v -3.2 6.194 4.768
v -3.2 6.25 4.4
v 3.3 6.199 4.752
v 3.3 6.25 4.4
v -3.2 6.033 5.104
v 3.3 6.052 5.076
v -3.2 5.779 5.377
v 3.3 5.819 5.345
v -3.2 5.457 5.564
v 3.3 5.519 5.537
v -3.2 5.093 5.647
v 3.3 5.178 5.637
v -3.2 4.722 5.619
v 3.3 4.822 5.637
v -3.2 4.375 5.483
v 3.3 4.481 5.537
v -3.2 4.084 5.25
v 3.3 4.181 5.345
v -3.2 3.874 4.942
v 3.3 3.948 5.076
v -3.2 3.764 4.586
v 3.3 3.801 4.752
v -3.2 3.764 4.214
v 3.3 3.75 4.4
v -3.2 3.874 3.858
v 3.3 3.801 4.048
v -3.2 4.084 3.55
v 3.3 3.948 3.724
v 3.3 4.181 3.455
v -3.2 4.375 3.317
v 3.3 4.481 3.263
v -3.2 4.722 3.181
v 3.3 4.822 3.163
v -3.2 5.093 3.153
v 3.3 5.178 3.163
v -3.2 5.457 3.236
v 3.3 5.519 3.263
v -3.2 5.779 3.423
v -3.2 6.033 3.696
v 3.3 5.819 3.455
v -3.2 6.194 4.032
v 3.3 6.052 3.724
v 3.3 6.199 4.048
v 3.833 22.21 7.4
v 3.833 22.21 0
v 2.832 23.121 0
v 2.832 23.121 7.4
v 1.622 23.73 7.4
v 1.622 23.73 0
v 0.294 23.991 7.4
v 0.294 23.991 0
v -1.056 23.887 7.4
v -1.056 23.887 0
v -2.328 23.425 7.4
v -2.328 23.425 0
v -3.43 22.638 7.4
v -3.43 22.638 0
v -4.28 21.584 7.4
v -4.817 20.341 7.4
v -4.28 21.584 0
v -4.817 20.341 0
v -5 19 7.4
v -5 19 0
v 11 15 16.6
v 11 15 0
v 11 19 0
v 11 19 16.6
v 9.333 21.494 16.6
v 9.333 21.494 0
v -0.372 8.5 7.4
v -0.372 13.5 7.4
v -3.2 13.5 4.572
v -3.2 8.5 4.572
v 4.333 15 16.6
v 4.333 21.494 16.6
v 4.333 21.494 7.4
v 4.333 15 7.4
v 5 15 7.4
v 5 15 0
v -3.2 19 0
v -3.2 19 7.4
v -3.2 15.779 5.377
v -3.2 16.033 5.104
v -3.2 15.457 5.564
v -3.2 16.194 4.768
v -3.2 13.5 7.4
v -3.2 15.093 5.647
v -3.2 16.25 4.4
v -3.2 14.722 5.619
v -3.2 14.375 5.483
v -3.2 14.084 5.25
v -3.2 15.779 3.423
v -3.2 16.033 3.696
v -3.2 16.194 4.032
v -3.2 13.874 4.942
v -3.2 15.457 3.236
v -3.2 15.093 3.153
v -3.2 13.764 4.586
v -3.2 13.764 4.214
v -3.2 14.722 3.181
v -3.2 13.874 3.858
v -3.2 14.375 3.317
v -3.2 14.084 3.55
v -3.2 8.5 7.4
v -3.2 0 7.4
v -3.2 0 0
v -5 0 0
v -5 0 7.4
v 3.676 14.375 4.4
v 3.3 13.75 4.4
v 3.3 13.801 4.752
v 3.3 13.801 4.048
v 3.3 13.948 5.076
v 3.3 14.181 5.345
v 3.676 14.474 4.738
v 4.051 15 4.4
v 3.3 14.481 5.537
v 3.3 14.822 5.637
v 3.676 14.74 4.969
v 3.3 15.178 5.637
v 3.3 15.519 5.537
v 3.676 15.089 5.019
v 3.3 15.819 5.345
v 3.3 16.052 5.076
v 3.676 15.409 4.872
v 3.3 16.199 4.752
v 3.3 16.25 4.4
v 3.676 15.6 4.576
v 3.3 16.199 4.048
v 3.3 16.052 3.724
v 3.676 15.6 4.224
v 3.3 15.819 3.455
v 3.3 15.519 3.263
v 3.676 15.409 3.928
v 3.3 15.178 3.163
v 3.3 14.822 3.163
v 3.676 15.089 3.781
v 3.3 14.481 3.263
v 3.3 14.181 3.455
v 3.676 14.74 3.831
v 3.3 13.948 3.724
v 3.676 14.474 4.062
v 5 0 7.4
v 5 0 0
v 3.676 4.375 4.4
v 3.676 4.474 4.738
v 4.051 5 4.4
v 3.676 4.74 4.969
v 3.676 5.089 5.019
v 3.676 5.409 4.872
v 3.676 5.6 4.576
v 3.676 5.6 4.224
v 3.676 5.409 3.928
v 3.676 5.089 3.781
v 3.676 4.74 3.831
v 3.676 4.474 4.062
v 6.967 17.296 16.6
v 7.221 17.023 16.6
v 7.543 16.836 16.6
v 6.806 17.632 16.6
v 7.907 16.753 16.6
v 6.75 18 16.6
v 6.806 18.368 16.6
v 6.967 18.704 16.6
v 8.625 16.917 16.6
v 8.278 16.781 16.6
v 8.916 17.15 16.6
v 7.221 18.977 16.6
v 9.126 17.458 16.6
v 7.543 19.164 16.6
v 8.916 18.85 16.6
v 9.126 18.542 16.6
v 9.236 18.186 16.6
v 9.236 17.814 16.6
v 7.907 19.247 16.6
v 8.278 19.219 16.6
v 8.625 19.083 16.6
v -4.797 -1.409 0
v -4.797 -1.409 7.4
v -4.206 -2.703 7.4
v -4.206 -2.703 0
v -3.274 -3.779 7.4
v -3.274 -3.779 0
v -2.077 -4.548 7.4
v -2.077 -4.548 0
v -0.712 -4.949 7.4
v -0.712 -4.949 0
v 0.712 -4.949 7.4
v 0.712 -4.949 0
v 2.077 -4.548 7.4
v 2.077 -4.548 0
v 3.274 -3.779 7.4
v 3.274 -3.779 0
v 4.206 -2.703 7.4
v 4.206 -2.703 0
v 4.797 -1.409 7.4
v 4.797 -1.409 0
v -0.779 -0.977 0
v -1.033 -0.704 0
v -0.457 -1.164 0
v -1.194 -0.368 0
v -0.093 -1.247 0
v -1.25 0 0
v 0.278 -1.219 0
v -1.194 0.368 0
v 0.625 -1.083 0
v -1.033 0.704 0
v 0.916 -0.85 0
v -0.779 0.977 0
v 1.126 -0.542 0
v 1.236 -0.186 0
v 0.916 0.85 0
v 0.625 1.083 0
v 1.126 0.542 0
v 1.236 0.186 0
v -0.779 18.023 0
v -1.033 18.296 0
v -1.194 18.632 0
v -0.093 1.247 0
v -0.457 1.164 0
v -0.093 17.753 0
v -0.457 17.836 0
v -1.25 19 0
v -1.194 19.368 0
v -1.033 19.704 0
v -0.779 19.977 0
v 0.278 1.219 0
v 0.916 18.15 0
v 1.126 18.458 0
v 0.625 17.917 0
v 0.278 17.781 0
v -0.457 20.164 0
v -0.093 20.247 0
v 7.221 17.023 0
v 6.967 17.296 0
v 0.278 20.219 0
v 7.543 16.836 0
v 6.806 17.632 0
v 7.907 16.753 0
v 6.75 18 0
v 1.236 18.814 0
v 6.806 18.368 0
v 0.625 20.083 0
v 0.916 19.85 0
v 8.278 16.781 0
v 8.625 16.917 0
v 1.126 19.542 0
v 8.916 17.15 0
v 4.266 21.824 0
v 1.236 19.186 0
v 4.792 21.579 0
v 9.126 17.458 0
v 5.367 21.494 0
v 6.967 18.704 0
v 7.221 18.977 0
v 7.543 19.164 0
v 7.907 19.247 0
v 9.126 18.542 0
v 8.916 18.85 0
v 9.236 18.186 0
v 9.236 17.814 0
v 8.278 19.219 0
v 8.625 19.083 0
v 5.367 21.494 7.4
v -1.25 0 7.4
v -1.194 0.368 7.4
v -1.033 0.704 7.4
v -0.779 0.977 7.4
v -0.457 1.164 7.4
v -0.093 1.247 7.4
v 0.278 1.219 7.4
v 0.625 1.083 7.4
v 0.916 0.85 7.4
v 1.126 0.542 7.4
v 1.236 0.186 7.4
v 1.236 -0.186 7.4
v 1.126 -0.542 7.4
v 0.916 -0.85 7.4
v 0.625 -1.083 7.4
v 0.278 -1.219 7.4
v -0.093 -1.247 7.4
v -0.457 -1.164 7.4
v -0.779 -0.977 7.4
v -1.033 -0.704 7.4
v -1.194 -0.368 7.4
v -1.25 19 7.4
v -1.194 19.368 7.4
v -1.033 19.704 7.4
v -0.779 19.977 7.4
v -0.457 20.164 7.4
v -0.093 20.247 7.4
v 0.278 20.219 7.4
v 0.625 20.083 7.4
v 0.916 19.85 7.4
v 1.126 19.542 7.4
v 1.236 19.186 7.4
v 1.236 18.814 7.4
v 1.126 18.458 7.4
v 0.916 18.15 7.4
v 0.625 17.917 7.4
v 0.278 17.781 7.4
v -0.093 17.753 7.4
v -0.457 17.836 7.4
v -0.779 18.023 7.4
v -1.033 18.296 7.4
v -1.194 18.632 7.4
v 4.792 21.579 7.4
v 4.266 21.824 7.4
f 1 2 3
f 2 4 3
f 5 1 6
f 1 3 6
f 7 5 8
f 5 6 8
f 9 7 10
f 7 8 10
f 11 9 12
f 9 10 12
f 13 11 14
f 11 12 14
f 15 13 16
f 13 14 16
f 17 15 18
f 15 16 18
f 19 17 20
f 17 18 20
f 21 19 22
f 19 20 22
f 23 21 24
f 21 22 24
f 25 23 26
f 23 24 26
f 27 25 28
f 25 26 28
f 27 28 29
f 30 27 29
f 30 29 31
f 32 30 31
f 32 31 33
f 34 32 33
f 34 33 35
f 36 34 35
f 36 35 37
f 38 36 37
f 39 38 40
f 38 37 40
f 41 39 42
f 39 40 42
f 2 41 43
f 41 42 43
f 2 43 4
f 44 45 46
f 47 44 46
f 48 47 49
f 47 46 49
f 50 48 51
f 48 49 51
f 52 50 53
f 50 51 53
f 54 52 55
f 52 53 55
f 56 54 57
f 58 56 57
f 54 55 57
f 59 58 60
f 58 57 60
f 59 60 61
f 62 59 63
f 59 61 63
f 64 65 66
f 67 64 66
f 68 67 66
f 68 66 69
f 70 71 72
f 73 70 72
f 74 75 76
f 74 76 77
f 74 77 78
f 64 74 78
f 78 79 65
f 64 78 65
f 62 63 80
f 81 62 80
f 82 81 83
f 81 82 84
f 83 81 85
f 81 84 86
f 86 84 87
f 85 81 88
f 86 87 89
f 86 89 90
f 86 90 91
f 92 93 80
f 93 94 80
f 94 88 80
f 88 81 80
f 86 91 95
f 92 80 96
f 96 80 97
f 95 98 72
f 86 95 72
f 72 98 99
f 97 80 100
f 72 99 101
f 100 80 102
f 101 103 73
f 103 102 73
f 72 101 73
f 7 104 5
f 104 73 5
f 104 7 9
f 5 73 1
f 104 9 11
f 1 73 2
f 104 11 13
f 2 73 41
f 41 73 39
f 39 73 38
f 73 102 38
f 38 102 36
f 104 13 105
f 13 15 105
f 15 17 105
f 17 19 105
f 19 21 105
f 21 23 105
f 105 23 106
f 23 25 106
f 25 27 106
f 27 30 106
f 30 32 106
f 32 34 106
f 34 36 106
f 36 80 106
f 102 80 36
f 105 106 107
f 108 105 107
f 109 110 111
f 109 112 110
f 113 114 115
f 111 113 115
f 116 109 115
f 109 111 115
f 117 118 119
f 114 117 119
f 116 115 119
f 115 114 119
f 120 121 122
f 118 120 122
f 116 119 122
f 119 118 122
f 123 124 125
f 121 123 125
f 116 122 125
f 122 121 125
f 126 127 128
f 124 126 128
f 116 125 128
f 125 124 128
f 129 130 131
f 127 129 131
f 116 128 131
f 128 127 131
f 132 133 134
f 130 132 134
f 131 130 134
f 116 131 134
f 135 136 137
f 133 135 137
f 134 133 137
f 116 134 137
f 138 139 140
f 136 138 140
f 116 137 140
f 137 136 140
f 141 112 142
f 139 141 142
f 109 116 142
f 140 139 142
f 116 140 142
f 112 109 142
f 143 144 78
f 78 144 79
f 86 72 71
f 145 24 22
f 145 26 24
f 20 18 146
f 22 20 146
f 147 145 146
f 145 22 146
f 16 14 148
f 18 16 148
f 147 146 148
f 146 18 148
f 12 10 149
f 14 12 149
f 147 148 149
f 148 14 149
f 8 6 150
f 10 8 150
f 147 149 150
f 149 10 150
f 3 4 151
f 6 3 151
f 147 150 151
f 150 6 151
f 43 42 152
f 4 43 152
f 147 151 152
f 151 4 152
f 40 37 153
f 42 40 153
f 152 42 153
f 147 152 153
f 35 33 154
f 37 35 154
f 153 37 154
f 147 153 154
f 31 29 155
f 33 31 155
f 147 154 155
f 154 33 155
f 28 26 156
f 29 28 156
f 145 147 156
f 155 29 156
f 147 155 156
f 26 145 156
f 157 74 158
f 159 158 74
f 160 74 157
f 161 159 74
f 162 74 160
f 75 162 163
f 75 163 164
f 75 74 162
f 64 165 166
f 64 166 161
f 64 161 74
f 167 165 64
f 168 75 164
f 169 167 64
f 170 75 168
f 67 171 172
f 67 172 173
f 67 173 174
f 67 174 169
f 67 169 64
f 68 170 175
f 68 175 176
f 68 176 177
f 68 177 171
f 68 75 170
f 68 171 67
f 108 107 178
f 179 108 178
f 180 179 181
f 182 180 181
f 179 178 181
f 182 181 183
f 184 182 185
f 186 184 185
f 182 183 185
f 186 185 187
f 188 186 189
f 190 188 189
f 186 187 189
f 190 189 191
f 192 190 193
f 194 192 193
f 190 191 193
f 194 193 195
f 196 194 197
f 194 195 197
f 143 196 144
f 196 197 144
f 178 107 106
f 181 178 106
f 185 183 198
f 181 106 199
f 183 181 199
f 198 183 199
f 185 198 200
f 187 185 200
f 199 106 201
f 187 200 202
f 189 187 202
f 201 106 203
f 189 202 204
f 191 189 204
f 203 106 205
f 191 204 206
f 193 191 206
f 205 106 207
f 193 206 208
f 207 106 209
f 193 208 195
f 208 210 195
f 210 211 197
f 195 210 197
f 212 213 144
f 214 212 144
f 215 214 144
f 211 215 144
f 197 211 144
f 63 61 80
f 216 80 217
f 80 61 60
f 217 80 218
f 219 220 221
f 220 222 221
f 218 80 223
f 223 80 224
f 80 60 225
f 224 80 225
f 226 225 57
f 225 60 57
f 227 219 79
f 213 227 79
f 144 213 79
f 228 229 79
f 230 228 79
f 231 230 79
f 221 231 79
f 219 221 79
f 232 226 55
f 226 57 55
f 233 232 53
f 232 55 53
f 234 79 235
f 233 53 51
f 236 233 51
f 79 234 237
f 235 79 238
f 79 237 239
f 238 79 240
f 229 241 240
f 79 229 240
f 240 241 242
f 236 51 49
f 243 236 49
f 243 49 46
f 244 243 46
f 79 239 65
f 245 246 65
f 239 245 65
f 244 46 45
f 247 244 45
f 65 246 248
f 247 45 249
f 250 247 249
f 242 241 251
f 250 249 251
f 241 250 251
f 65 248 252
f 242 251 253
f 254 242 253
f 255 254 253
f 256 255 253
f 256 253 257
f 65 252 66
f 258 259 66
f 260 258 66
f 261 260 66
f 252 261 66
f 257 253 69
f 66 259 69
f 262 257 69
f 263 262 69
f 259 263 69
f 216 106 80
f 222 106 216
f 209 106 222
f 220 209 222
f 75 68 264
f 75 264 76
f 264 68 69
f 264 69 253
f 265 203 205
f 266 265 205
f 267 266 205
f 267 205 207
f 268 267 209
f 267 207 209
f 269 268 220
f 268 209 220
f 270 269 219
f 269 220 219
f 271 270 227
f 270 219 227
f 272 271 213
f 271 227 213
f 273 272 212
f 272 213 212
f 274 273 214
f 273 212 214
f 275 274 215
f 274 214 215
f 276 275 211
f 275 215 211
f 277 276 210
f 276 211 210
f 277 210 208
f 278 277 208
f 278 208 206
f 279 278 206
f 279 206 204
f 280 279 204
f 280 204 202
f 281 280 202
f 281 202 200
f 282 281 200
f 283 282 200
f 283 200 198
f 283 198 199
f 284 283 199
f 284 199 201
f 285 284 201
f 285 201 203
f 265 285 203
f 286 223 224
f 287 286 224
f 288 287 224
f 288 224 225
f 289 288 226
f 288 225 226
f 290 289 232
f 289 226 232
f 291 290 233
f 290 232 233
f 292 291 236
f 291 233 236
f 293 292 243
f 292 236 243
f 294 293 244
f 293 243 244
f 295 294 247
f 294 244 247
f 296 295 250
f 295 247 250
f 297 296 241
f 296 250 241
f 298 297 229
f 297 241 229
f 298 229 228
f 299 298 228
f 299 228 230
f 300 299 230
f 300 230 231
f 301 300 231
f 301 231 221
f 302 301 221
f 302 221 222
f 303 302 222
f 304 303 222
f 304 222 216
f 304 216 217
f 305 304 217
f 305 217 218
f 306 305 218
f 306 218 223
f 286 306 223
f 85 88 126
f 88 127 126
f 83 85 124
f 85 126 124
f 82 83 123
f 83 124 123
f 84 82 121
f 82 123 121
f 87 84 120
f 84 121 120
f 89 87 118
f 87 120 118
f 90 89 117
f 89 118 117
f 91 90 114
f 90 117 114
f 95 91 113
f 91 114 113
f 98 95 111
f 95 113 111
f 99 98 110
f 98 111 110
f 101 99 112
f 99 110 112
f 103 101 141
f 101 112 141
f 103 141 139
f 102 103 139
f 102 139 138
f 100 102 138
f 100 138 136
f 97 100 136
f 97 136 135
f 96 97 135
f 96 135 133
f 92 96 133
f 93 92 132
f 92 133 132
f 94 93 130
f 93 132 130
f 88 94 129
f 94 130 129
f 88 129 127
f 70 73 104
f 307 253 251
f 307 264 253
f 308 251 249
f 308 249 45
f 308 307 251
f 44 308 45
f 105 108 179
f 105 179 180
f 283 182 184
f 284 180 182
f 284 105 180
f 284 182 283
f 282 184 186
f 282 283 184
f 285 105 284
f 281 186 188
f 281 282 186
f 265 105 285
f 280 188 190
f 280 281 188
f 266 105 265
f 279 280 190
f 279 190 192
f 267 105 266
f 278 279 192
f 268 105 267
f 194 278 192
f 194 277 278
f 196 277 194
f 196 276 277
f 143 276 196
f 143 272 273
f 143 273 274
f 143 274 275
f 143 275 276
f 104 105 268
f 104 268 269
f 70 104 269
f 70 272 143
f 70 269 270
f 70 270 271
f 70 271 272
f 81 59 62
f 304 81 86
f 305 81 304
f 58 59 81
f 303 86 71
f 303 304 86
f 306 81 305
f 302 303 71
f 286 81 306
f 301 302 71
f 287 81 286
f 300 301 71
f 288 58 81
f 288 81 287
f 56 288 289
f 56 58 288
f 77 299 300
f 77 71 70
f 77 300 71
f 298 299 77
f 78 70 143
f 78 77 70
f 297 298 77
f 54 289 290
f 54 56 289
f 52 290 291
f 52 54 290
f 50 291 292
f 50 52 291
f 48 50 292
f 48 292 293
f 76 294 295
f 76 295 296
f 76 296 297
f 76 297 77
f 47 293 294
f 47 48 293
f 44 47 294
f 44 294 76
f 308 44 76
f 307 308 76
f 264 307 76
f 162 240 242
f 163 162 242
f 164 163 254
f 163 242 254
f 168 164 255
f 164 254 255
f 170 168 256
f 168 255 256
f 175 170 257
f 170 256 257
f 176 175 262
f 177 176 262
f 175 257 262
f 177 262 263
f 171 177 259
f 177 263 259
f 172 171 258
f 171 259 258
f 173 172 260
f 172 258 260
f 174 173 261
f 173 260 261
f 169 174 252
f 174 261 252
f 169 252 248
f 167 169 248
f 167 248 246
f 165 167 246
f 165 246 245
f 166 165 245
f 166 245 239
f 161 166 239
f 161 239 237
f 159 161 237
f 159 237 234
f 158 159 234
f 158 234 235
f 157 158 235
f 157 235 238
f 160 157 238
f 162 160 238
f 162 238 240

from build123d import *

# Parameters (mm, degrees)
EXTRUDE_1_DEPTH        = 7.4
EXTRUDE_2_DEPTH        = 9.2
HOLE_WIZARD_M3_1_D     = 2.5
HOLE_WIZARD_M3_1_DEPTH = 6.5
HOLE_WIZARD_M3_1_TIP   = 0.751075774
HOLE_WIZARD_M3_3_D     = 2.5
FILLET_1_R             = 2
CUT_EXTRUDE_1_DEPTH    = 5
HOLE_WIZARD_M3_5_D     = 2.5


with BuildPart() as part:
    # 草图1 → 凸台-拉伸1 (new body)
    with BuildSketch(Plane.XY):
        with BuildLine():
            Line((-3.2, 19), (-3.2, 0))
            Line((-3.2, 0), (-5, 0))
            ThreePointArc((-5, 0), (0, -5), (5, 0))
            Line((5, 0), (5, 4))
            Line((5, 4), (5, 15))
            Line((5, 15), (11, 15))
            Line((11, 15), (11, 19))
            Line((11, 19), (9.333333333, 21.494438258))
            Line((9.333333333, 21.494438258), (4.333333333, 21.494438258))
            ThreePointArc((4.333333333, 21.494438258), (-1.290994449, 23.830458915), (-5, 19))
            Line((-5, 19), (-3.2, 19))
        make_face()
    extrude(amount=EXTRUDE_1_DEPTH)

    # 草图2 → 凸台-拉伸2 (add)
    with BuildSketch(Plane.XY.offset(7.4)):
        Polygon((11, 19), (9.333333333, 21.494438258), (4.333333333, 21.494438258), (4.333333333, 15), (5, 15), (11, 15), align=None)
    extrude(amount=EXTRUDE_2_DEPTH)

    # M3 螺纹孔1
    with Locations(Plane(origin=(-3.2, 15, 4.4), x_dir=(0, -1, 0), z_dir=(-1, 0, 0))):
        with Locations((0, 0), (10, 0)):
            Hole(HOLE_WIZARD_M3_1_D / 2, depth=HOLE_WIZARD_M3_1_DEPTH)
            with Locations((0, 0, -(HOLE_WIZARD_M3_1_DEPTH + HOLE_WIZARD_M3_1_TIP / 2))):  # 118° drill point
                Cone(0, HOLE_WIZARD_M3_1_D / 2, HOLE_WIZARD_M3_1_TIP, mode=Mode.SUBTRACT)

    # M3 螺纹孔3 (through all)
    with Locations(Plane.XY.offset(7.4)):
        with Locations((0, 0), (0, 19)):
            Hole(HOLE_WIZARD_M3_3_D / 2)

    # 圆角1
    fillet_1_edges = [part.edges().sort_by_distance(p)[0] for p in [
        (4.333333333, 21.494438258, 3.7),
    ]]
    fillet(fillet_1_edges, radius=FILLET_1_R)

    # 草图10 → 切除-拉伸1 (cut)
    with BuildSketch(Plane(origin=(0, 13.5, 0), x_dir=(1, 0, 0), z_dir=(0, 1, 0))):
        Polygon((-3.2, -7.4), (-0.371572875, -7.4), (-3.2, -4.571572875), align=None)
    extrude(amount=-CUT_EXTRUDE_1_DEPTH, mode=Mode.SUBTRACT)

    # M3 螺纹孔5 (through all)
    with Locations(Plane(origin=(8, 18, 16.6), x_dir=(1, 0, 0), z_dir=(0, 0, 1))):
        with Locations((0, 0)):
            Hole(HOLE_WIZARD_M3_5_D / 2)


solid = part.part
